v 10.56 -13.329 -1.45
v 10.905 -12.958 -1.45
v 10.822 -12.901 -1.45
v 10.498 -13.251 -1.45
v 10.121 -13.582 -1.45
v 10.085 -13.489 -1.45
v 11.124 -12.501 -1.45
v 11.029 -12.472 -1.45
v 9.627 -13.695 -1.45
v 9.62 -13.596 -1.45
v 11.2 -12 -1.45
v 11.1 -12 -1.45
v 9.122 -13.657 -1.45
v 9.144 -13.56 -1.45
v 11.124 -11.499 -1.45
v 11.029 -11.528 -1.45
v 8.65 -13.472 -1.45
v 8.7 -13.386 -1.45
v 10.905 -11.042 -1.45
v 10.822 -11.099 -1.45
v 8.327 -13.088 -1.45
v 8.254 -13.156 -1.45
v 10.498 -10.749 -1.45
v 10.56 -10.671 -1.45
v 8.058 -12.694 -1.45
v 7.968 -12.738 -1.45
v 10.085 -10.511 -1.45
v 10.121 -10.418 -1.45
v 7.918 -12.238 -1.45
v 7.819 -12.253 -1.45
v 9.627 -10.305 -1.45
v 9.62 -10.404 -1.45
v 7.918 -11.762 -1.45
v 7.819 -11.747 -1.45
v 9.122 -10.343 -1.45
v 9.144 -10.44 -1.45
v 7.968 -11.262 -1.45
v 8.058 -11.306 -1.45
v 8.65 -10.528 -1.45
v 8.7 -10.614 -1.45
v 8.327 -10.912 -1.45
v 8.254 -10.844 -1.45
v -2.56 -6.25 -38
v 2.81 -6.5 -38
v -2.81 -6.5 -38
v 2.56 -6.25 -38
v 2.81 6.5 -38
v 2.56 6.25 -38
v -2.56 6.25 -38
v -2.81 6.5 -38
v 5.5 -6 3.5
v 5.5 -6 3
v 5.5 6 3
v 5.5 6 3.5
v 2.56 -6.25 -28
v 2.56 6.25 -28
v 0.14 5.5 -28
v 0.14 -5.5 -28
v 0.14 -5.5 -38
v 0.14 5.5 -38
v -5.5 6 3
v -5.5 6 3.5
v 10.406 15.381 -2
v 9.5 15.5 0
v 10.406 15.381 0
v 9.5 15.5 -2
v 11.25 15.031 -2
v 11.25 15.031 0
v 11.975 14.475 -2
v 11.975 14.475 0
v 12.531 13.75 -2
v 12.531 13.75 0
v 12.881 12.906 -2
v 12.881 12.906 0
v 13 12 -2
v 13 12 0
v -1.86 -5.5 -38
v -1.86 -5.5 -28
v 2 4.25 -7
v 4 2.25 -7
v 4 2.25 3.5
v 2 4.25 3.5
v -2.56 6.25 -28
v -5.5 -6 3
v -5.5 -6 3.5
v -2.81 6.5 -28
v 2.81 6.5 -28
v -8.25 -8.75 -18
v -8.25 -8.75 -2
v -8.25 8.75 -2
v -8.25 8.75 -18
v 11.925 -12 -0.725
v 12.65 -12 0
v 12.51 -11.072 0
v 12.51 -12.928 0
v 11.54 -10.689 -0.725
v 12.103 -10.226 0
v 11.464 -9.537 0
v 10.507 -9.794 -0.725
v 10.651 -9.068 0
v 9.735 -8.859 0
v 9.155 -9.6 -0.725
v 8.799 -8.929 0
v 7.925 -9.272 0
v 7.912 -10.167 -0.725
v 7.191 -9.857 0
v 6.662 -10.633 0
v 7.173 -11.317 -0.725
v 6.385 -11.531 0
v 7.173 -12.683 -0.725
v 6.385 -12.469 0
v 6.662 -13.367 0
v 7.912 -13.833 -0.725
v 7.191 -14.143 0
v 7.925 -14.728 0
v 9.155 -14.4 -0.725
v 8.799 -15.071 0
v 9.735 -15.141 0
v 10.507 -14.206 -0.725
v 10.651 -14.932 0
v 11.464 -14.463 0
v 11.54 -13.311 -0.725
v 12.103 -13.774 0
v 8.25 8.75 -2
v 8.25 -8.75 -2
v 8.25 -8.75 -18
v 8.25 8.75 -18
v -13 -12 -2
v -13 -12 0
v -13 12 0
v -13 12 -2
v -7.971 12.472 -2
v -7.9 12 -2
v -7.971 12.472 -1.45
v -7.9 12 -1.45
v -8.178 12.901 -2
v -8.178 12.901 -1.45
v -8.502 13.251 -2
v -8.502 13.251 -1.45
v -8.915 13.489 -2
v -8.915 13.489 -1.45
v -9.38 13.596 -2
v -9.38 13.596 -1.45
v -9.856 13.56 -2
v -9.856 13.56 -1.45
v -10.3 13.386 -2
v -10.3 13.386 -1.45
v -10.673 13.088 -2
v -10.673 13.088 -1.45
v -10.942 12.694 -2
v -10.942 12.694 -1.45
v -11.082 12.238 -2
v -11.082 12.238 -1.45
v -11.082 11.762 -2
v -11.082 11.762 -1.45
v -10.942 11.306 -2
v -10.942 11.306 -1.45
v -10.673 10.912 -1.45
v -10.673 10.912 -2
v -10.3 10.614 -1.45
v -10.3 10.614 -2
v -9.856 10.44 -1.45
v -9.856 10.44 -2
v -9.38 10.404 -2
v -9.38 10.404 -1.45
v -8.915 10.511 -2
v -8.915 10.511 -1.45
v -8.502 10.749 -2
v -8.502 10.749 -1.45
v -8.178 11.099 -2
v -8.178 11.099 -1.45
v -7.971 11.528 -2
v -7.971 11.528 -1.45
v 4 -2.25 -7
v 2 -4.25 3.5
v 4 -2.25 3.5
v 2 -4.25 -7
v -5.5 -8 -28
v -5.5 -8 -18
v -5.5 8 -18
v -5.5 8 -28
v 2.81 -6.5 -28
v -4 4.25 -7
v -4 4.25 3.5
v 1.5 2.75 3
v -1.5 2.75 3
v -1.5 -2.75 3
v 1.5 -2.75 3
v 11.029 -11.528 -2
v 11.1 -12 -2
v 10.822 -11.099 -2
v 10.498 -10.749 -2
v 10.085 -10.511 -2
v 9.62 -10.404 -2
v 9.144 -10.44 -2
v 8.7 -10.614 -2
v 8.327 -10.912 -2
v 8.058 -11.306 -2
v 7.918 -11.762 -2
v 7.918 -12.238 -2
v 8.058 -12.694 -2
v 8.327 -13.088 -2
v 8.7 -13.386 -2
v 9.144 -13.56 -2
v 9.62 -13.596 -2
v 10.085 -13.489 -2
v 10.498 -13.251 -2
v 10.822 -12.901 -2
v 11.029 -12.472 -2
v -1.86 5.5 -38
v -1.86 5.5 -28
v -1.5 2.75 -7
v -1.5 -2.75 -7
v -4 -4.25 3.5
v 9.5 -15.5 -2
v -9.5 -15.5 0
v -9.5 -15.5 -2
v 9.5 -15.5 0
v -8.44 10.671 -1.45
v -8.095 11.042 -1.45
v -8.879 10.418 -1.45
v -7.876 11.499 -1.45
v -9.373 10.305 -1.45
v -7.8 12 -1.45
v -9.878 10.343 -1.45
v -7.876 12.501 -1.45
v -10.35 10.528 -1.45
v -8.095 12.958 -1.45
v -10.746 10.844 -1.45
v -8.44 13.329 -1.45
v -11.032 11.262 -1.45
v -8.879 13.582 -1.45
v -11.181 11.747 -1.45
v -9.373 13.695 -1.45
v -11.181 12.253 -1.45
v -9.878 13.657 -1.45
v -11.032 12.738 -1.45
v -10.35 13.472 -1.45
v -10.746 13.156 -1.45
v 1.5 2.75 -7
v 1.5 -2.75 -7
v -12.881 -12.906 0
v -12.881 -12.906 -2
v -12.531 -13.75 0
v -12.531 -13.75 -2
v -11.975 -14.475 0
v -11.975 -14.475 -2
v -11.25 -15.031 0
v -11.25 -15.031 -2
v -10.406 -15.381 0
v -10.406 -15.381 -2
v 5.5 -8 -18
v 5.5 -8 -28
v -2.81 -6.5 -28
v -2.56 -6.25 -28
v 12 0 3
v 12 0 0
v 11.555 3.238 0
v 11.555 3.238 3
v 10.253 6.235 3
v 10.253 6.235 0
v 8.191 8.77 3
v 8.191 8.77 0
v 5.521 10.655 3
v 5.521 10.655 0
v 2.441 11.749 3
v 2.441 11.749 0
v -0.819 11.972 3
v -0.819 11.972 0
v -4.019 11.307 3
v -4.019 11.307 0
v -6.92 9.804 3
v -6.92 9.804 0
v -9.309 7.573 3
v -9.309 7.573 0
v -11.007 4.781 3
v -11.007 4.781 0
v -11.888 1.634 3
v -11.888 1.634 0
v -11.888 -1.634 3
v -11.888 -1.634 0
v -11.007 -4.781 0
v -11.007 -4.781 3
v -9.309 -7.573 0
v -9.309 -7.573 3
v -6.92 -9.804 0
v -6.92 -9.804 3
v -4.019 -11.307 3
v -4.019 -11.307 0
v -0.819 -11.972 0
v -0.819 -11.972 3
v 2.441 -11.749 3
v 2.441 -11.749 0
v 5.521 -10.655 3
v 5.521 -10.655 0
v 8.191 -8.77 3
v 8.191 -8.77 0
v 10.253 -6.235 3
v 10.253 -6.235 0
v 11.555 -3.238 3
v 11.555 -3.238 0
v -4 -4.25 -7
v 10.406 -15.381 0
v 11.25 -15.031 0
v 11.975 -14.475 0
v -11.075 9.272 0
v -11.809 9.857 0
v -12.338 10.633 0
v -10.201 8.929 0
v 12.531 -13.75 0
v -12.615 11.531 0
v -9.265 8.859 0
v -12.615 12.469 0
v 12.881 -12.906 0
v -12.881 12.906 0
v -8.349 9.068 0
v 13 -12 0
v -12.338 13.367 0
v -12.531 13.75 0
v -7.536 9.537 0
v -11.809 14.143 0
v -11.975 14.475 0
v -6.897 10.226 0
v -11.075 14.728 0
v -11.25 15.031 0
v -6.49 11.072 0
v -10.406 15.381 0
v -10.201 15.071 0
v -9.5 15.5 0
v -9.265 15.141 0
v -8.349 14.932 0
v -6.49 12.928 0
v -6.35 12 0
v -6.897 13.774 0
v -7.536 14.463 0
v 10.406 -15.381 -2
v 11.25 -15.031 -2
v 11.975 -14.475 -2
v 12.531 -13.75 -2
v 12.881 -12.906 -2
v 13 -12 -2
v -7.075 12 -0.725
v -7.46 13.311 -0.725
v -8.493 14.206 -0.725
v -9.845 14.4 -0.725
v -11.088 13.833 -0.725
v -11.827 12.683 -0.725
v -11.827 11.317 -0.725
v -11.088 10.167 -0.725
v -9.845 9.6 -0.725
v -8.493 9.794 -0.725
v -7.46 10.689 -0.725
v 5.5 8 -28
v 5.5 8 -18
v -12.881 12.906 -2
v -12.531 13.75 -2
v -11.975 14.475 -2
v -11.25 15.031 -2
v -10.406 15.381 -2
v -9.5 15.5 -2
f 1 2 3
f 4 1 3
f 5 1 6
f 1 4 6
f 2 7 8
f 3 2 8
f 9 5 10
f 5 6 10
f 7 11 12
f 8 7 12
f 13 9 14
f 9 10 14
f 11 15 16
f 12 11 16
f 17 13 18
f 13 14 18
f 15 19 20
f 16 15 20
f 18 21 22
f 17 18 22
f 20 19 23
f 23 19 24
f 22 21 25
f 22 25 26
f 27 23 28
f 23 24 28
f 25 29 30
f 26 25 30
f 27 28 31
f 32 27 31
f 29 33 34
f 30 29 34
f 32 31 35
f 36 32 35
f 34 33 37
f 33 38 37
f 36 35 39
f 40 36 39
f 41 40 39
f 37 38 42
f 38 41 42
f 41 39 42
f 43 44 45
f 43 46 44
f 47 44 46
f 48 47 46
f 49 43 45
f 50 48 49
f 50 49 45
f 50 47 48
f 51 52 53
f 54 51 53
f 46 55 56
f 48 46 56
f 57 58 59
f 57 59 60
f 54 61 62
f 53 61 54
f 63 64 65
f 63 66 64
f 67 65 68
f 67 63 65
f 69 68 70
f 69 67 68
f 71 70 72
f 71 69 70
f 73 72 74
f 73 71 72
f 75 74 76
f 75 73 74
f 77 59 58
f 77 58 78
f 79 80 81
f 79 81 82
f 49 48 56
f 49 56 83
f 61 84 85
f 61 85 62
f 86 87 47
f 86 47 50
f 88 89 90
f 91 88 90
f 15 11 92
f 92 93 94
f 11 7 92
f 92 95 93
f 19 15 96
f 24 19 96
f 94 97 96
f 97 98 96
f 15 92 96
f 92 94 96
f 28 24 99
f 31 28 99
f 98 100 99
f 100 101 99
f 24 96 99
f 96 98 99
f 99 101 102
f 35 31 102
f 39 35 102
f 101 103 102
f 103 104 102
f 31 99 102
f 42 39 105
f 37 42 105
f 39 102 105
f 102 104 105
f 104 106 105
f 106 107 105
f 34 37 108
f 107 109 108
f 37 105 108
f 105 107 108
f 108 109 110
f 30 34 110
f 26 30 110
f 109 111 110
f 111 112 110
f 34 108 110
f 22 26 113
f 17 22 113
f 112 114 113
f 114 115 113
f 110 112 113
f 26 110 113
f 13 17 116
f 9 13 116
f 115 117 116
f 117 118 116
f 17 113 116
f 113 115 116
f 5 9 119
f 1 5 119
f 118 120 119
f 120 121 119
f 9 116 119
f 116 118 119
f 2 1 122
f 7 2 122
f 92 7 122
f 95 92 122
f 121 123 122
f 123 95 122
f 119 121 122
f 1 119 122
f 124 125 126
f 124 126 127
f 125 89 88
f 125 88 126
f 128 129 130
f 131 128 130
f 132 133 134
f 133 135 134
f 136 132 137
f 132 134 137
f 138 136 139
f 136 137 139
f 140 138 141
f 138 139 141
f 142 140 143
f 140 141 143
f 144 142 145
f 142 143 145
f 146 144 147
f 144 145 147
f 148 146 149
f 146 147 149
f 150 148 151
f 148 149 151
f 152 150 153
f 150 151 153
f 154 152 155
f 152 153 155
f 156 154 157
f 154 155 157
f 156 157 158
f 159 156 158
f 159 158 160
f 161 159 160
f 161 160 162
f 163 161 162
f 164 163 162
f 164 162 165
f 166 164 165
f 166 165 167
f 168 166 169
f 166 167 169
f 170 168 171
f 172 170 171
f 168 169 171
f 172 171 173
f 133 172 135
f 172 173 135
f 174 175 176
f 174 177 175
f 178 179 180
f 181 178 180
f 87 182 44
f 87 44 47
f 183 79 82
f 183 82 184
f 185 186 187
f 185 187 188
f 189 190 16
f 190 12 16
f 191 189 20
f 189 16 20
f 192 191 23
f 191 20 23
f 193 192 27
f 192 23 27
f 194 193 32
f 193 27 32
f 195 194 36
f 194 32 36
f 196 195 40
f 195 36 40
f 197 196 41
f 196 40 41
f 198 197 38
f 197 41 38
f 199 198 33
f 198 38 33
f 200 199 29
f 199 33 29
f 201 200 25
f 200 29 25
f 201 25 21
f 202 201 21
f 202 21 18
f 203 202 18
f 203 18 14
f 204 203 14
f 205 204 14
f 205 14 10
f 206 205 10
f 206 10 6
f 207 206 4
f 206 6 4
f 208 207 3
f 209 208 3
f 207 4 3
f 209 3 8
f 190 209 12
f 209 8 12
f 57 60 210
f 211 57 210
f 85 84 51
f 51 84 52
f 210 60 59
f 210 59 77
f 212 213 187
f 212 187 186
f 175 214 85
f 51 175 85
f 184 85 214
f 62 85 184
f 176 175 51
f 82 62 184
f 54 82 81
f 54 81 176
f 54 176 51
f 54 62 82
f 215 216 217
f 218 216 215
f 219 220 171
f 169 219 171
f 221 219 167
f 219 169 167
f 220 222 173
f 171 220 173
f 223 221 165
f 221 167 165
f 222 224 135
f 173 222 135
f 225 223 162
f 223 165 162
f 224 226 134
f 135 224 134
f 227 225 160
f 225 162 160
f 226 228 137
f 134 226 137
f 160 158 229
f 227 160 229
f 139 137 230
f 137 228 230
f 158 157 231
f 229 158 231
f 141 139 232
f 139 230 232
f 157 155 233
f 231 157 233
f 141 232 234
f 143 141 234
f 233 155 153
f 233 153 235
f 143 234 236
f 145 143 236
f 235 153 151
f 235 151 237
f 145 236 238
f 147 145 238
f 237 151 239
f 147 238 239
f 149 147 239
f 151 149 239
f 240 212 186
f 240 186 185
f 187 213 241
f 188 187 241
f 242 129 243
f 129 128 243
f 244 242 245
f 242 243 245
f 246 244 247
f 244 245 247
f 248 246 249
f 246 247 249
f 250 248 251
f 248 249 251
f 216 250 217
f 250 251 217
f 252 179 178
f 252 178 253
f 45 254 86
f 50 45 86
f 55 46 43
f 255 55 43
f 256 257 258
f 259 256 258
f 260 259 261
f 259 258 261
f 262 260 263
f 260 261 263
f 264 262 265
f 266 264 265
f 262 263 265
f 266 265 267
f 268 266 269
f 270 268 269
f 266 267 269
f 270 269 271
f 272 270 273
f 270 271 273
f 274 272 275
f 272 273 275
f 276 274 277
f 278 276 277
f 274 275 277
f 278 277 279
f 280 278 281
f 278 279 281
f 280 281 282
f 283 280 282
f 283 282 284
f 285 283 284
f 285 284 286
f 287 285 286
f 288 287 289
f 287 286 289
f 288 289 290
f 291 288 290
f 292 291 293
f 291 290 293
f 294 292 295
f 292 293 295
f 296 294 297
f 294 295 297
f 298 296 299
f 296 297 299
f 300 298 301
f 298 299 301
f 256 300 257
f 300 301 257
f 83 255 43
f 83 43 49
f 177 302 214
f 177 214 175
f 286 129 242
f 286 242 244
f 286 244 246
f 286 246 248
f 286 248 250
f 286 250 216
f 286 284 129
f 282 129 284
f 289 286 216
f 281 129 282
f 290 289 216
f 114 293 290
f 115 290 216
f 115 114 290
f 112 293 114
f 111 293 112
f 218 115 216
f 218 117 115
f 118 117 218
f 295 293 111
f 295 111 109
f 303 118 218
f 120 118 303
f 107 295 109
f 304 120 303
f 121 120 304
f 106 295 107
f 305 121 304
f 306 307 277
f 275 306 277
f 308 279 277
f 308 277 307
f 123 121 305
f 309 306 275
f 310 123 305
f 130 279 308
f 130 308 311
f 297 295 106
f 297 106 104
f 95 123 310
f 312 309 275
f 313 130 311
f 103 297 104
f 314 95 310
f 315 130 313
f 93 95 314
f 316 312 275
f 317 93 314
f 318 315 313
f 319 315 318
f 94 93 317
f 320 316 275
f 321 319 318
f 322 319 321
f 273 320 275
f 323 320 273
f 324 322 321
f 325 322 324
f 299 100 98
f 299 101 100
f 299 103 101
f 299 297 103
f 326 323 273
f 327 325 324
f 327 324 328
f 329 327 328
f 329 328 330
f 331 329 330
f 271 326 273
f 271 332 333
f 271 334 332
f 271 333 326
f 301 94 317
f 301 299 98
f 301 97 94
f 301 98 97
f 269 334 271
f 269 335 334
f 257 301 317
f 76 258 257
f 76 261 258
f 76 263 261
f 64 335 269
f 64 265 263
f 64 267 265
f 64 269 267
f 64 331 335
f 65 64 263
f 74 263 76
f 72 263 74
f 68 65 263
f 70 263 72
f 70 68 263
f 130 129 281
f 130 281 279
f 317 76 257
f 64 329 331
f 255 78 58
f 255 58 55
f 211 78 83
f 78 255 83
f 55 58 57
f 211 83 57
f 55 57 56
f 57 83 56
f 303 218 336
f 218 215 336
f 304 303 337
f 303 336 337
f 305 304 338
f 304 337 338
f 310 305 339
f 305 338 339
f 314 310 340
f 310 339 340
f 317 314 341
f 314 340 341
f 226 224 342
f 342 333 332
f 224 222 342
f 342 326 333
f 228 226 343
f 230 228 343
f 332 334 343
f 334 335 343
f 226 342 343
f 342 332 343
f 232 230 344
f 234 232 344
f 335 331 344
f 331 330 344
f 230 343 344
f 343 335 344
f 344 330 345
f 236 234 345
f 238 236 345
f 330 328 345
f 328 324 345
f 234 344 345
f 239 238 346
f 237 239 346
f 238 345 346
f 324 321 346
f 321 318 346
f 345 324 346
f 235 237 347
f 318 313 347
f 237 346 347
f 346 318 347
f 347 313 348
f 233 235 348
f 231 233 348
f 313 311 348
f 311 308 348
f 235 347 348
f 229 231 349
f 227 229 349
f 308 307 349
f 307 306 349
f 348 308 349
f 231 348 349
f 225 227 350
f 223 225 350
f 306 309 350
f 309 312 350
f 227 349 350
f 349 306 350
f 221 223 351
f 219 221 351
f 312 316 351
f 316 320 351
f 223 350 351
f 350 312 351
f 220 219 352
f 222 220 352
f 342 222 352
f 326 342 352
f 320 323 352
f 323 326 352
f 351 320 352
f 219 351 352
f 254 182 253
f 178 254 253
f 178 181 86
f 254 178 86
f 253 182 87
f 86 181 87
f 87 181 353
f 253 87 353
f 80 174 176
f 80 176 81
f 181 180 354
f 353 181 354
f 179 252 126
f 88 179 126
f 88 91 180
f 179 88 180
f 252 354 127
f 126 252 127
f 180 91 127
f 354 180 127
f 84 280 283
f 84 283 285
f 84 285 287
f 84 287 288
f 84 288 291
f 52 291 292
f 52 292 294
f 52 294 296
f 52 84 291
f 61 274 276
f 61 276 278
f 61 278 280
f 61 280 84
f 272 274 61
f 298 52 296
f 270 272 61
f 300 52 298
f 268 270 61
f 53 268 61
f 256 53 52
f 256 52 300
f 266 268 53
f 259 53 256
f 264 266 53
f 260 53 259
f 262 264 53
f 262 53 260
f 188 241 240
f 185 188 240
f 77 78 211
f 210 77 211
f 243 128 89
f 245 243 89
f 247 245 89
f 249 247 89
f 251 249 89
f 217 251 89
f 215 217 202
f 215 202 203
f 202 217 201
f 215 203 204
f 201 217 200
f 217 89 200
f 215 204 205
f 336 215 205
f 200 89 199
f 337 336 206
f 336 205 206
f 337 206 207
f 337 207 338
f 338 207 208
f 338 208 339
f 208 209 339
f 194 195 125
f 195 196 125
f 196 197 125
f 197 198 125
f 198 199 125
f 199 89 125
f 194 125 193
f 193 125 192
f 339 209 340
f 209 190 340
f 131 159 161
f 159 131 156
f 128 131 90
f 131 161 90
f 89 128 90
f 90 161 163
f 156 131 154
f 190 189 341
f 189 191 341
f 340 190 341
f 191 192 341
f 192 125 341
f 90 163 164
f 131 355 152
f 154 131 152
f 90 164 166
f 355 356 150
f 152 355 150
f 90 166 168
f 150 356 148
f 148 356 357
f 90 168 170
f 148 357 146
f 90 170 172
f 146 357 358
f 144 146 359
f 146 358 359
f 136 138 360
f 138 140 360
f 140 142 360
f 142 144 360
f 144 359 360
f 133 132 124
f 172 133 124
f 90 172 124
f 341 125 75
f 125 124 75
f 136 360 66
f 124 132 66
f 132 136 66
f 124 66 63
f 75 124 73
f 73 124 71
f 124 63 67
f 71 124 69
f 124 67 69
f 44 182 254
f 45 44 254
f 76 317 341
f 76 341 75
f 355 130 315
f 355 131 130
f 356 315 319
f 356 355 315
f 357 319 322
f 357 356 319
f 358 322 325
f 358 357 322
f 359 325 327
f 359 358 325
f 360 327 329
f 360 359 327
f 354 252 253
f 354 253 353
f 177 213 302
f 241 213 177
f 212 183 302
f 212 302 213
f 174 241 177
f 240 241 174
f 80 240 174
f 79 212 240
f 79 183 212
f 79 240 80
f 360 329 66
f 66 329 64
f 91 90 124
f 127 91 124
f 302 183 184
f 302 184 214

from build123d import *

# Parameters (mm, degrees)
SZKIC2_R                    = 12
DODANIE_WYCI_GNI_CIE1_DEPTH = 3
SZKIC2_3_W                  = 26
SZKIC2_3_H                  = 31
DODANIE_WYCI_GNI_CIE2_DEPTH = 2
DODANIE_WYCI_GNI_CIE3_START = -2
SZKIC2_4_W                  = 16.5
SZKIC2_4_H                  = 17.5
DODANIE_WYCI_GNI_CIE3_DEPTH = 16
DODANIE_WYCI_GNI_CIE4_START = -2
SZKIC2_5_W                  = 11
SZKIC2_5_H                  = 16
DODANIE_WYCI_GNI_CIE4_DEPTH = 26
ZAOKR_GLENIE1_R             = 3.5
SZKIC6_W                    = 5.62
SZKIC6_H                    = 13
SZKIC6_W_2                  = 5.12
SZKIC6_H_2                  = 12.5
SZKIC6_W_3                  = 2
SZKIC6_H_3                  = 11
DODANIE_WYCI_GNI_CIE5_DEPTH = 10
SZKIC7_W                    = 3
SZKIC7_H                    = 5.5
WYTNIJ_WYCI_GNI_CIE1_DEPTH  = 10
SZKIC7_3_W                  = 11
SZKIC7_3_H                  = 12
DODANIE_WYCI_GNI_CIE6_DEPTH = 0.5


# Read off the part's stored shape, not the designer's step: ZaawansowanyOtwór1
with BuildPart() as part:
    # Szkic2 → Dodanie-wyciągnięcie1 (new body)
    with BuildSketch(Plane.XY):
        Circle(SZKIC2_R)
    extrude(amount=DODANIE_WYCI_GNI_CIE1_DEPTH)

    # Szkic2<3> → Dodanie-wyciągnięcie2 (add)
    with BuildSketch(Plane.XY):
        Rectangle(SZKIC2_3_W, SZKIC2_3_H)
    extrude(amount=-DODANIE_WYCI_GNI_CIE2_DEPTH)

    # Szkic2<4> → Dodanie-wyciągnięcie3 (add)
    with BuildSketch(Plane.XY.offset(DODANIE_WYCI_GNI_CIE3_START)):
        Rectangle(SZKIC2_4_W, SZKIC2_4_H)
    extrude(amount=-DODANIE_WYCI_GNI_CIE3_DEPTH)

    # Szkic2<5> → Dodanie-wyciągnięcie4 (add)
    with BuildSketch(Plane.XY.offset(DODANIE_WYCI_GNI_CIE4_START)):
        Rectangle(SZKIC2_5_W, SZKIC2_5_H)
    extrude(amount=-DODANIE_WYCI_GNI_CIE4_DEPTH)

    # Zaokrąglenie1
    zaokr_glenie1_edges = [part.edges().sort_by_distance(p)[0] for p in [
        (-13, -15.5, -1),
        (-13, 15.5, -1),
        (13, 15.5, -1),
        (13, -15.5, -1),
    ]]
    fillet(zaokr_glenie1_edges, radius=ZAOKR_GLENIE1_R)

    # ZaawansowanyOtwór1 outline → ZaawansowanyOtwór1 (revolve, cut)
    with BuildSketch(Plane(origin=(9.5, -12, 0), x_dir=(1, 0, 0), z_dir=(0, -1, 0))):
        Polygon((1.6, -1.45), (1.7, -1.45), (3.15, 0), (0, 0), (0, -2), (1.6, -2), align=None)
    revolve(axis=Axis((9.5, -12, 0), (0, 0, 1)), mode=Mode.SUBTRACT)

    # ZaawansowanyOtw_r1 2 outline → ZaawansowanyOtw_r1 2 (revolve, cut)
    with BuildSketch(Plane(origin=(-9.5, 12, 0), x_dir=(1, 0, 0), z_dir=(0, -1, 0))):
        Polygon((3.15, 0), (0, 0), (0, -2), (1.6, -2), (1.6, -1.45), (1.7, -1.45), align=None)
    revolve(axis=Axis((-9.5, 12, 0), (0, 0, 1)), mode=Mode.SUBTRACT)

    # Szkic6 → Dodanie-wyciągnięcie5 (add)
    # profile 1 of 2: a face of its own
    with BuildSketch(Plane(origin=(0, 0, -28), x_dir=(-1, 0, 0), z_dir=(0, 0, -1))):
        Rectangle(SZKIC6_W, SZKIC6_H)
        Rectangle(SZKIC6_W_2, SZKIC6_H_2, mode=Mode.SUBTRACT)
    # profile 2 of 2: a face of its own
    with BuildSketch(Plane(origin=(0, 0, -28), x_dir=(-1, 0, 0), z_dir=(0, 0, -1))):
        with Locations((0.86, 0)):
            Rectangle(SZKIC6_W_3, SZKIC6_H_3)
    extrude(amount=DODANIE_WYCI_GNI_CIE5_DEPTH)

    # Szkic7 → Wytnij-wyciągnięcie1 (cut)
    with BuildSketch(Plane.XY.offset(3)):
        Polygon((-4, -4.25), (2, -4.25), (4, -2.25), (4, 2.25), (2, 4.25), (-4, 4.25), align=None)
        Rectangle(SZKIC7_W, SZKIC7_H, mode=Mode.SUBTRACT)
    extrude(amount=-WYTNIJ_WYCI_GNI_CIE1_DEPTH, mode=Mode.SUBTRACT)

    # Szkic7<3> → Dodanie-wyciągnięcie6 (add)
    with BuildSketch(Plane.XY.offset(3)):
        Rectangle(SZKIC7_3_W, SZKIC7_3_H)
        Polygon((2, -4.25), (4, -2.25), (4, 2.25), (2, 4.25), (-4, 4.25), (-4, -4.25), align=None, mode=Mode.SUBTRACT)
    extrude(amount=DODANIE_WYCI_GNI_CIE6_DEPTH)


solid = part.part
